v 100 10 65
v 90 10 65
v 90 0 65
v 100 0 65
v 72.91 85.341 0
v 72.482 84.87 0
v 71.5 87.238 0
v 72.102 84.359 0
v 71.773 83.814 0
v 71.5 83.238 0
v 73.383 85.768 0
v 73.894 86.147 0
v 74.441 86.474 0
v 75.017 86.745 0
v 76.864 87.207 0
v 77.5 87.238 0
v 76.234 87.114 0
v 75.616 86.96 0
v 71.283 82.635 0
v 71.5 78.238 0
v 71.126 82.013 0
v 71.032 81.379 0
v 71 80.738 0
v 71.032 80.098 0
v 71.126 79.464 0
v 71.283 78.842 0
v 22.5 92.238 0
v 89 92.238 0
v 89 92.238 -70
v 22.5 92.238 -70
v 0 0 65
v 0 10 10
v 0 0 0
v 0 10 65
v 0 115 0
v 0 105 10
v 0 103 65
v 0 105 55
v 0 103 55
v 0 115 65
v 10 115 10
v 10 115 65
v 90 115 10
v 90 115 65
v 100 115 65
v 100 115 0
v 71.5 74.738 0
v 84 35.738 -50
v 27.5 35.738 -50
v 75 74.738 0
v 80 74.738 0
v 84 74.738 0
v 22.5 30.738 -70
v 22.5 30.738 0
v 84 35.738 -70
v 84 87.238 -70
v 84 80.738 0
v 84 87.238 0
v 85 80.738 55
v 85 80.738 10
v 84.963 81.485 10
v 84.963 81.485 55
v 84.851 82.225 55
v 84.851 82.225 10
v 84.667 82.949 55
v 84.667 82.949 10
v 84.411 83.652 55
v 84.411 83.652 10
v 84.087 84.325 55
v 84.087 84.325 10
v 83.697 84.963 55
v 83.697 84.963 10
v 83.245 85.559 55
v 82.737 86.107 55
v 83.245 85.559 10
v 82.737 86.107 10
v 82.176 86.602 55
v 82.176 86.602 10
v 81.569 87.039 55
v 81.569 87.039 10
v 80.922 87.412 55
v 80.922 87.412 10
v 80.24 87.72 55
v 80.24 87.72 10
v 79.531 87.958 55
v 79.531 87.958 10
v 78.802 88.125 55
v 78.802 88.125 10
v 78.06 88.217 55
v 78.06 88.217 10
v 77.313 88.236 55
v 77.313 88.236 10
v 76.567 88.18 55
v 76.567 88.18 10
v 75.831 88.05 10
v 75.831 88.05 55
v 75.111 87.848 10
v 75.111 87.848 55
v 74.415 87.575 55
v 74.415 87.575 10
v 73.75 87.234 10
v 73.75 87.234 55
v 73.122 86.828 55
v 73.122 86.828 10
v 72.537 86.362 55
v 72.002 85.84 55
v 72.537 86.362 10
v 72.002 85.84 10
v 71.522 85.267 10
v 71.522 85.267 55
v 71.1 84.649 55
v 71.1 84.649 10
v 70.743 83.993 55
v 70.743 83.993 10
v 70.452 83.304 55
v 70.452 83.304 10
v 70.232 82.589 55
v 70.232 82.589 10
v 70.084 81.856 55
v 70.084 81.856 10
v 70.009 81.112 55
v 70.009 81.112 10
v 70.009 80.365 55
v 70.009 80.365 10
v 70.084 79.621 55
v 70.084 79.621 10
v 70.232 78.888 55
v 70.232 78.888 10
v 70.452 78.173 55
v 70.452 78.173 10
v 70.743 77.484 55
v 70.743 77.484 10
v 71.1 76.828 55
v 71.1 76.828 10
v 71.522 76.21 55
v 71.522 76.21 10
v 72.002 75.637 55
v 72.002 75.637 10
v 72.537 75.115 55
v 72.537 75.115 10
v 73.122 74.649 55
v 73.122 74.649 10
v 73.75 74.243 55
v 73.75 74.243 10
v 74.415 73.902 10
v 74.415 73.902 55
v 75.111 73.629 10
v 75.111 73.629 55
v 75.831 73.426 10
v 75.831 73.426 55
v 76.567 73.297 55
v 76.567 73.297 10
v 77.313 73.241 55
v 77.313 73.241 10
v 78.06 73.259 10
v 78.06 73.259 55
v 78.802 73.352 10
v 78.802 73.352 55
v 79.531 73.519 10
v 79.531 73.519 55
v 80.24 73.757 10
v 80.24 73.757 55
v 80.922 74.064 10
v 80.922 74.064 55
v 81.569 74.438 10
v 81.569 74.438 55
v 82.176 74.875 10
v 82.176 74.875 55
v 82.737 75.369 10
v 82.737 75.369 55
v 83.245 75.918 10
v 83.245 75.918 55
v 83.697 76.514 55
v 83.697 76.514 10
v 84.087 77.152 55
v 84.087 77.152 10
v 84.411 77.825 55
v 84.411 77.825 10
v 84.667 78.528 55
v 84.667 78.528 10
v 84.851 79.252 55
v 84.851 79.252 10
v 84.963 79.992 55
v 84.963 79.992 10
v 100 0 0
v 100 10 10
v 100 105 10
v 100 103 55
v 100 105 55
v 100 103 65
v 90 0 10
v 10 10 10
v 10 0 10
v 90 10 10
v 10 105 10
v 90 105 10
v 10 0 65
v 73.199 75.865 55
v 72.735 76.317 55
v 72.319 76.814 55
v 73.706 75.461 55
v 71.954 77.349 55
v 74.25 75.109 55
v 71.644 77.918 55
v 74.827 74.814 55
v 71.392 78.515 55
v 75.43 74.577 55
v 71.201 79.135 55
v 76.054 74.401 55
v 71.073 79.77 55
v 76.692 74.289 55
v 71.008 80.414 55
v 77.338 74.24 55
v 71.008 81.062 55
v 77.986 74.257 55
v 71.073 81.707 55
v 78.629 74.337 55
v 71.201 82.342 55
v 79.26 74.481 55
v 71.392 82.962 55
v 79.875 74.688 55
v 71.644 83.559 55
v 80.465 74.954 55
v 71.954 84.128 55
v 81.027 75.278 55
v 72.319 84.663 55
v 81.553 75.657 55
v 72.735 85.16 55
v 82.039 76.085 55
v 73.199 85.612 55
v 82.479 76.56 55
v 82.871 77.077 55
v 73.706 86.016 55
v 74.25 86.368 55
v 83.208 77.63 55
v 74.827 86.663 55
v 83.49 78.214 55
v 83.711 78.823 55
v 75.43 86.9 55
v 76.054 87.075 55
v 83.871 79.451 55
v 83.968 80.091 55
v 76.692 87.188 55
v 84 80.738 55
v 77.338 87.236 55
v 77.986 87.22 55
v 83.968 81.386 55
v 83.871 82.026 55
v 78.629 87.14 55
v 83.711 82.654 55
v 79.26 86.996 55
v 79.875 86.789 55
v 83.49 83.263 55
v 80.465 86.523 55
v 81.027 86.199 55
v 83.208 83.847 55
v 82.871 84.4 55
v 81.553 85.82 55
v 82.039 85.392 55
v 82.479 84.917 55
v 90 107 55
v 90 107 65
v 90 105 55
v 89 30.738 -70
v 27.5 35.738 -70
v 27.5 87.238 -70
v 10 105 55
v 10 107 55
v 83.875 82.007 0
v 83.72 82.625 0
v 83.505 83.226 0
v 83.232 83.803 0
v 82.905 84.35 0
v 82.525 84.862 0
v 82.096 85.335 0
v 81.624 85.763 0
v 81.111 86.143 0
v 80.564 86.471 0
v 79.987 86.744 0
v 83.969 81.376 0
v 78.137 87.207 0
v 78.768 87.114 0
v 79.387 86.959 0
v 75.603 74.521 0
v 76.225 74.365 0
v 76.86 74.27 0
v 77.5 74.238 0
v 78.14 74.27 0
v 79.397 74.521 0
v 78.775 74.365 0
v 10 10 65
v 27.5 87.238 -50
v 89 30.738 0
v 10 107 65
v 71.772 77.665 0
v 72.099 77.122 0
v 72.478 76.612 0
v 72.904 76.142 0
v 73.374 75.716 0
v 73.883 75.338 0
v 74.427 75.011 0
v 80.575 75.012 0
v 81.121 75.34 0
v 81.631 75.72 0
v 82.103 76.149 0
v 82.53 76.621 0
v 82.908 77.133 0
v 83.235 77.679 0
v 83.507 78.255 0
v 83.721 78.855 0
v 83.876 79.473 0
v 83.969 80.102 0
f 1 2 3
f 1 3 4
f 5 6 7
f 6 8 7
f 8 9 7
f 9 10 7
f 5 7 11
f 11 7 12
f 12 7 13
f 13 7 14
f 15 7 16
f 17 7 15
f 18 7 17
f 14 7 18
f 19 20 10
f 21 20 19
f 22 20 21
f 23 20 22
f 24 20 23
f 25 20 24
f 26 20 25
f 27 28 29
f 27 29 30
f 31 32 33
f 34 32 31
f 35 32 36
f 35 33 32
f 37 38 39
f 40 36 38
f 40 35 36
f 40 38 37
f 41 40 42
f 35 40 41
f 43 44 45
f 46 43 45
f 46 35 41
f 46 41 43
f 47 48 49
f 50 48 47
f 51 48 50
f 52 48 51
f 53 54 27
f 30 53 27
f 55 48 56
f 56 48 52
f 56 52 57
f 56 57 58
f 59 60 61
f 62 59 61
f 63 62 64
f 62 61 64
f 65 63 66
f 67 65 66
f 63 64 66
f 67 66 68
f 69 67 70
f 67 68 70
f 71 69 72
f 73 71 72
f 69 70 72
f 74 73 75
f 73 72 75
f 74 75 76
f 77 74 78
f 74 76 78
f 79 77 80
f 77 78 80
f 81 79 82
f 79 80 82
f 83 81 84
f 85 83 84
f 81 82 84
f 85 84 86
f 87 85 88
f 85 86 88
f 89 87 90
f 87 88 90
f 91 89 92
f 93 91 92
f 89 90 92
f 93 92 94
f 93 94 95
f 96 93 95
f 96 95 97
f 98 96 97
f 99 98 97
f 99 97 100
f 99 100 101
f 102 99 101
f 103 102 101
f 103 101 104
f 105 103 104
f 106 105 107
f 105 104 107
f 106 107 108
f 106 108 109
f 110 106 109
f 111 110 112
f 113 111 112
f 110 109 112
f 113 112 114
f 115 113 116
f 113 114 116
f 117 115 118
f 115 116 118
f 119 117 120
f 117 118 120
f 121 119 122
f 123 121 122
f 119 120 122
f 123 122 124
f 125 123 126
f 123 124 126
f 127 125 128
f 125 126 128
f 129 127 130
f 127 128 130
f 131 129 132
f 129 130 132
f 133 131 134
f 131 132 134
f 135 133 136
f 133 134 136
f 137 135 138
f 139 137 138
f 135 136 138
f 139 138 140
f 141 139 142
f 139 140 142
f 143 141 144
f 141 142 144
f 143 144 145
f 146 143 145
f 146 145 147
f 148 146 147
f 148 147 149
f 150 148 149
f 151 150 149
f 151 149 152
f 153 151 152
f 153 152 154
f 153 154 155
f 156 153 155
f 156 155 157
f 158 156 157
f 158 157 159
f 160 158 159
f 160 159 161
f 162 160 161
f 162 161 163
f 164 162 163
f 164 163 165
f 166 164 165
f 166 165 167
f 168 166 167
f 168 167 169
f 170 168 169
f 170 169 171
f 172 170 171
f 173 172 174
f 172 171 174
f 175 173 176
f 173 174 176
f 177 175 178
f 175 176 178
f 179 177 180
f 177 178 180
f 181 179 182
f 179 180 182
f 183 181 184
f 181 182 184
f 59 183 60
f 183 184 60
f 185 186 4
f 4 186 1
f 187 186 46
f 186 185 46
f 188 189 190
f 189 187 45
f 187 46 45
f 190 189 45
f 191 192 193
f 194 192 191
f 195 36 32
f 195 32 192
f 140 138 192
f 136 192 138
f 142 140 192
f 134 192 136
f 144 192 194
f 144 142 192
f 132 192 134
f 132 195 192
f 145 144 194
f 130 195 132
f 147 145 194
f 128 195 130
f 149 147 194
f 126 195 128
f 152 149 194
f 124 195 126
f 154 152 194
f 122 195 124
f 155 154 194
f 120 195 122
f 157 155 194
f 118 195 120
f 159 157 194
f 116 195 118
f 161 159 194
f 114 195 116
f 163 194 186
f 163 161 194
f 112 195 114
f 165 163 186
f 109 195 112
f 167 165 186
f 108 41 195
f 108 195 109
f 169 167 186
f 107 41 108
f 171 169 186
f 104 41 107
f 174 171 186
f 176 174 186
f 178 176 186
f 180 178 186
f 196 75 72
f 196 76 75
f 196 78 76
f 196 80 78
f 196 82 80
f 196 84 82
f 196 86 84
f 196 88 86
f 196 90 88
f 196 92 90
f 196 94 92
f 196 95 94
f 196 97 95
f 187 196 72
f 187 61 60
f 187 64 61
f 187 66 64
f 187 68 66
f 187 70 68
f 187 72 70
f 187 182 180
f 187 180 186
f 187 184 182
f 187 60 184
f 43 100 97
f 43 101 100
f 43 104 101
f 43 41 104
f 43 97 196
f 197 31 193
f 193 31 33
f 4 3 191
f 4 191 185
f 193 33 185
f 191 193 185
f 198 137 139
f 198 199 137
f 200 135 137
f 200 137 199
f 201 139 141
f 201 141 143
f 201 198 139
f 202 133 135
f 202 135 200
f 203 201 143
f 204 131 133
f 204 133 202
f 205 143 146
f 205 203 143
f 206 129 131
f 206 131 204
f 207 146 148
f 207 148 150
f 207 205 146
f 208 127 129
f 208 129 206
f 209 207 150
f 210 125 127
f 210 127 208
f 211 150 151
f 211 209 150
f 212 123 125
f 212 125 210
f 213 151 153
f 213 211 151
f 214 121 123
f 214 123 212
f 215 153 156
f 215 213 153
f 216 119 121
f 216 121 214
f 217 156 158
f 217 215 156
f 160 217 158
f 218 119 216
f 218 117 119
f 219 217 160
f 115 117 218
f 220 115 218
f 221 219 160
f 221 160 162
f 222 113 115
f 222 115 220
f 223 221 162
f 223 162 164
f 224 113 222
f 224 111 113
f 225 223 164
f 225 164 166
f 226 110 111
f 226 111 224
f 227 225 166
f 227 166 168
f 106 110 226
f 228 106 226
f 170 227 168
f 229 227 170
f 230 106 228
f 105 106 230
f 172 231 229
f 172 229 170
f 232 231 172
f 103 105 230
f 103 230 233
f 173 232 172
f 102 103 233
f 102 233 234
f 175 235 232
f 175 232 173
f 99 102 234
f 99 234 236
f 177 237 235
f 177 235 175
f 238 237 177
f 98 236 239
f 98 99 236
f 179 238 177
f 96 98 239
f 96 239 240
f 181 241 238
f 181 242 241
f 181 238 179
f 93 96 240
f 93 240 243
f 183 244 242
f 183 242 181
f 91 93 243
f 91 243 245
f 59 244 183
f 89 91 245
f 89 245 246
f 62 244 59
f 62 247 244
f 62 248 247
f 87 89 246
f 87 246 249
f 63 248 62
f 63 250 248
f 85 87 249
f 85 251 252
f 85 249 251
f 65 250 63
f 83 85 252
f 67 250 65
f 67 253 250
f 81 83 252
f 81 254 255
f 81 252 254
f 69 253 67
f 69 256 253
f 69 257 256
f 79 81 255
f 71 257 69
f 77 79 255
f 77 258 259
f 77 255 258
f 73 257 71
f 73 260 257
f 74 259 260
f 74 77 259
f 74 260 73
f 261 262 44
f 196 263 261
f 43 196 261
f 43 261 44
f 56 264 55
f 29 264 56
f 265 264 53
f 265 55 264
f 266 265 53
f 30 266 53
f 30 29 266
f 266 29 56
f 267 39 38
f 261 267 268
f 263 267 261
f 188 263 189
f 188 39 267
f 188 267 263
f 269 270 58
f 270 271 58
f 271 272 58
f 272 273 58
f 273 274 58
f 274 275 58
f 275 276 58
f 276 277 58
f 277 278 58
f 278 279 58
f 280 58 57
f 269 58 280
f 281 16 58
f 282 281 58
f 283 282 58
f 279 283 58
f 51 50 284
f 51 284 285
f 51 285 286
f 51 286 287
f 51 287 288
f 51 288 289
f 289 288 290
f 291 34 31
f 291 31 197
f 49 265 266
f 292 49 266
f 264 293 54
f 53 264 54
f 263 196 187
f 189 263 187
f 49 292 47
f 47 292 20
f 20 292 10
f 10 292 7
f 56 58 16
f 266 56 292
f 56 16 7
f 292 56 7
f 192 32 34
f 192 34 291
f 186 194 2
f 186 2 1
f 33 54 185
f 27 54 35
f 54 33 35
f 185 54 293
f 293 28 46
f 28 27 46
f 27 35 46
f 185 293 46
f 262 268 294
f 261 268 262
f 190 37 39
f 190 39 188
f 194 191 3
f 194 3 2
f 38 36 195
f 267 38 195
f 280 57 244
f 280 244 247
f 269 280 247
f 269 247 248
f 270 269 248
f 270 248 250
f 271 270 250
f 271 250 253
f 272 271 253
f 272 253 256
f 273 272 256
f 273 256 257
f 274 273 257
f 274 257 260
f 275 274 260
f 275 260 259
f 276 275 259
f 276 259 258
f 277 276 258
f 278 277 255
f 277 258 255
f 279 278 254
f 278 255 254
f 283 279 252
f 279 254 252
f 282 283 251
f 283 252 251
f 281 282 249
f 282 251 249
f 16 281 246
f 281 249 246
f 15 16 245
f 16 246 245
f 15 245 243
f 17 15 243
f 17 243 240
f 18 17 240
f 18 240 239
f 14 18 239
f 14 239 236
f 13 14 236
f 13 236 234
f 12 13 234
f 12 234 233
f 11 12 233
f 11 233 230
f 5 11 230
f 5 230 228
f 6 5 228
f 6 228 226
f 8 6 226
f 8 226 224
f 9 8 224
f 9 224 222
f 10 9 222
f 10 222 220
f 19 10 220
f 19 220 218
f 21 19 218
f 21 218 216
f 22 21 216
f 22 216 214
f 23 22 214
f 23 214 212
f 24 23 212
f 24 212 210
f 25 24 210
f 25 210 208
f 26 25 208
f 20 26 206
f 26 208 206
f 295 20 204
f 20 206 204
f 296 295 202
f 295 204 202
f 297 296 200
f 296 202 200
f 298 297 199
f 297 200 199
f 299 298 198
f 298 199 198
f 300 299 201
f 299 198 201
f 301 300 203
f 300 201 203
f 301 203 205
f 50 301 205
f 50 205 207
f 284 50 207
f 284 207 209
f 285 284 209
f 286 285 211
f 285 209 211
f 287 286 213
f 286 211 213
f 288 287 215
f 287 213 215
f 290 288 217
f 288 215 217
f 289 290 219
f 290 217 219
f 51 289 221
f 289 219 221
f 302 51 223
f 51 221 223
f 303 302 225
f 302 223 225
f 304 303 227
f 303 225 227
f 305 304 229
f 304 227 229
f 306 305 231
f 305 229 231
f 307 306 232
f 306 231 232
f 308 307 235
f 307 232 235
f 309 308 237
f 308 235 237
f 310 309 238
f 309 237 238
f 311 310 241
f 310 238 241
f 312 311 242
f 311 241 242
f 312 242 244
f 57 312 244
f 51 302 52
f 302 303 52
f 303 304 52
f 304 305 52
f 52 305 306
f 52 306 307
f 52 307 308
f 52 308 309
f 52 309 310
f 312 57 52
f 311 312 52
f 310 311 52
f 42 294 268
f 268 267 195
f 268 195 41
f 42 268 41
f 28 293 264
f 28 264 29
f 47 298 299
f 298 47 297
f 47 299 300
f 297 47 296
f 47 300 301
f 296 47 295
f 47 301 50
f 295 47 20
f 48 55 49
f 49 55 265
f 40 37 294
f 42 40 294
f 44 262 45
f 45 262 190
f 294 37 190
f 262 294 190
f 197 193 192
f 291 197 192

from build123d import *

# Parameters (mm, degrees)
ESQUISSE1_W             = 100
ESQUISSE1_H             = 115
BOSS_EXTRU_2_DEPTH      = 10
ESQUISSE2_W             = 10
ESQUISSE2_H             = 10
BOSS_EXTRU_8_DEPTH      = 55
ESQUISSE9_W             = 10
ESQUISSE9_H             = 10
BOSS_EXTRU_9_DEPTH      = 55
ESQUISSE10_W            = 10
ESQUISSE10_H            = 10
BOSS_EXTRU_10_DEPTH     = 55
ESQUISSE11_W            = 10
ESQUISSE11_H            = 10
BOSS_EXTRU_11_DEPTH     = 55
ESQUISSE14_W            = 100
ESQUISSE14_H            = 10
BOSS_EXTRU_12_DEPTH     = 2
ESQUISSE15_W            = 80
ESQUISSE15_H            = 10
BOSS_EXTRU_13_DEPTH     = 2
ESQUISSE16_R            = 7.5
BOSS_EXTRU_16_DEPTH     = 45
ESQUISSE17_R            = 6.5
ENL_V_MAT_EXTRU_1_DEPTH = 59
ESQUISSE18_W            = 5
ESQUISSE18_H            = 56.5
BOSS_EXTRU_17_DEPTH     = 70
ESQUISSE19_W            = 56.5
ESQUISSE19_H            = 5
BOSS_EXTRU_18_DEPTH     = 70
ESQUISSE21_W            = 5
ESQUISSE21_H            = 56.5
BOSS_EXTRU_19_DEPTH     = 70
ESQUISSE22_W            = 66.5
ESQUISSE22_H            = 5
BOSS_EXTRU_20_DEPTH     = 70
BOSS_EXTRU_21_DEPTH     = 70
ENL_V_MAT_EXTRU_2_DEPTH = 70
BOSS_EXTRU_26_REACH     = 89.238
BOSS_EXTRU_28_REACH     = 86


with BuildPart() as part:
    # Esquisse1 → Boss.-Extru.2 (new body)
    with BuildSketch(Plane.XY):
        with Locations((50, 57.5)):
            Rectangle(ESQUISSE1_W, ESQUISSE1_H)
    extrude(amount=BOSS_EXTRU_2_DEPTH)

    # Esquisse2 → Boss.-Extru.8 (add)
    with BuildSketch(Plane.XY.offset(10)):
        with Locations((5, 110)):
            Rectangle(ESQUISSE2_W, ESQUISSE2_H)
    extrude(amount=BOSS_EXTRU_8_DEPTH)

    # Esquisse9 → Boss.-Extru.9 (add)
    with BuildSketch(Plane.XY.offset(10)):
        with Locations((95, 110)):
            Rectangle(ESQUISSE9_W, ESQUISSE9_H)
    extrude(amount=BOSS_EXTRU_9_DEPTH)

    # Esquisse10 → Boss.-Extru.10 (add)
    with BuildSketch(Plane.XY.offset(10)):
        with Locations((5, 5)):
            Rectangle(ESQUISSE10_W, ESQUISSE10_H)
    extrude(amount=BOSS_EXTRU_10_DEPTH)

    # Esquisse11 → Boss.-Extru.11 (add)
    with BuildSketch(Plane.XY.offset(10)):
        with Locations((95, 5)):
            Rectangle(ESQUISSE11_W, ESQUISSE11_H)
    extrude(amount=BOSS_EXTRU_11_DEPTH)

    # Esquisse14 → Boss.-Extru.12 (add)
    with BuildSketch(Plane.XZ.offset(-105)):
        with Locations((50, 60)):
            Rectangle(ESQUISSE14_W, ESQUISSE14_H)
    extrude(amount=BOSS_EXTRU_12_DEPTH)

    # Esquisse15 → Boss.-Extru.13 (add)
    with BuildSketch(Plane(origin=(0, 105, 0), x_dir=(1, 0, 0), z_dir=(0, 1, 0))):
        with Locations((50, -60)):
            Rectangle(ESQUISSE15_W, ESQUISSE15_H)
    extrude(amount=BOSS_EXTRU_13_DEPTH)

    # Esquisse16 → Boss.-Extru.16 (add)
    with BuildSketch(Plane.XY.offset(10)):
        with Locations((77.5, 80.738453234)):
            Circle(ESQUISSE16_R)
    extrude(amount=BOSS_EXTRU_16_DEPTH)

    # Esquisse17 → Enlèv. mat.-Extru.1 (cut)
    with BuildSketch(Plane.XY.offset(55)):
        with Locations((77.5, 80.738453234)):
            Circle(ESQUISSE17_R)
    extrude(amount=-ENL_V_MAT_EXTRU_1_DEPTH, mode=Mode.SUBTRACT)

    # Esquisse18 → Boss.-Extru.17 (add)
    with BuildSketch(Plane(origin=(0, 0, 0), x_dir=(-1, 0, 0), z_dir=(0, 0, -1))):
        with Locations((-25, 58.988453234)):
            Rectangle(ESQUISSE18_W, ESQUISSE18_H)
    extrude(amount=BOSS_EXTRU_17_DEPTH)

    # Esquisse19 → Boss.-Extru.18 (add)
    with BuildSketch(Plane(origin=(0, 0, 0), x_dir=(-1, 0, 0), z_dir=(0, 0, -1))):
        with Locations((-55.75, 33.238453234)):
            Rectangle(ESQUISSE19_W, ESQUISSE19_H)
    extrude(amount=BOSS_EXTRU_18_DEPTH)

    # Esquisse21 → Boss.-Extru.19 (add)
    with BuildSketch(Plane(origin=(0, 0, 0), x_dir=(-1, 0, 0), z_dir=(0, 0, -1))):
        with Locations((-86.5, 58.988453234)):
            Rectangle(ESQUISSE21_W, ESQUISSE21_H)
    extrude(amount=BOSS_EXTRU_19_DEPTH)

    # Esquisse22 → Boss.-Extru.20 (add)
    with BuildSketch(Plane(origin=(0, 0, 0), x_dir=(-1, 0, 0), z_dir=(0, 0, -1))):
        with Locations((-55.75, 89.738453234)):
            Rectangle(ESQUISSE22_W, ESQUISSE22_H)
    extrude(amount=BOSS_EXTRU_20_DEPTH)

    # Esquisse26 → Boss.-Extru.21 (add)
    with BuildSketch(Plane(origin=(0, 0, -70), x_dir=(-1, 0, 0), z_dir=(0, 0, -1))):
        Polygon((-27.5, 87.238453234), (-84, 35.738453234), (-27.5, 35.738453234), align=None)
    extrude(amount=-BOSS_EXTRU_21_DEPTH)

    # Esquisse23 → Enlèv. mat.-Extru.2 (cut)
    with BuildSketch(Plane(origin=(0, 0, -70), x_dir=(-1, 0, 0), z_dir=(0, 0, -1))):
        Polygon((-27.5, 87.238453234), (-84, 35.738453234), (-27.5, 35.738453234), align=None)
    extrude(amount=-ENL_V_MAT_EXTRU_2_DEPTH, mode=Mode.SUBTRACT)

    # Esquisse24 → Boss.-Extru.26 (add, up to next)
    with BuildSketch(Plane.XZ.offset(-87.238453234), mode=Mode.PRIVATE) as boss_extru_26_sk1:
        Polygon((27.5, -50), (71.5, 0), (27.5, 0), align=None)
    boss_extru_26_tool1 = extrude(boss_extru_26_sk1.sketch, amount=BOSS_EXTRU_26_REACH, mode=Mode.PRIVATE) - part.part
    add(boss_extru_26_tool1.solids().sort_by_distance((42.166667, 87.238453, -16.666667))[0])

    # Esquisse29 → Boss.-Extru.28 (add, up to next)
    with BuildSketch(Plane.ZY.offset(-84), mode=Mode.PRIVATE) as boss_extru_28_sk1:
        Polygon((0, 35.738453234), (-50, 35.738453234), (0, 74.738453234), align=None)
    boss_extru_28_tool1 = extrude(boss_extru_28_sk1.sketch, amount=BOSS_EXTRU_28_REACH, mode=Mode.PRIVATE) - part.part
    add(boss_extru_28_tool1.solids().sort_by_distance((84, 48.738453, -16.666667))[0])


solid = part.part
